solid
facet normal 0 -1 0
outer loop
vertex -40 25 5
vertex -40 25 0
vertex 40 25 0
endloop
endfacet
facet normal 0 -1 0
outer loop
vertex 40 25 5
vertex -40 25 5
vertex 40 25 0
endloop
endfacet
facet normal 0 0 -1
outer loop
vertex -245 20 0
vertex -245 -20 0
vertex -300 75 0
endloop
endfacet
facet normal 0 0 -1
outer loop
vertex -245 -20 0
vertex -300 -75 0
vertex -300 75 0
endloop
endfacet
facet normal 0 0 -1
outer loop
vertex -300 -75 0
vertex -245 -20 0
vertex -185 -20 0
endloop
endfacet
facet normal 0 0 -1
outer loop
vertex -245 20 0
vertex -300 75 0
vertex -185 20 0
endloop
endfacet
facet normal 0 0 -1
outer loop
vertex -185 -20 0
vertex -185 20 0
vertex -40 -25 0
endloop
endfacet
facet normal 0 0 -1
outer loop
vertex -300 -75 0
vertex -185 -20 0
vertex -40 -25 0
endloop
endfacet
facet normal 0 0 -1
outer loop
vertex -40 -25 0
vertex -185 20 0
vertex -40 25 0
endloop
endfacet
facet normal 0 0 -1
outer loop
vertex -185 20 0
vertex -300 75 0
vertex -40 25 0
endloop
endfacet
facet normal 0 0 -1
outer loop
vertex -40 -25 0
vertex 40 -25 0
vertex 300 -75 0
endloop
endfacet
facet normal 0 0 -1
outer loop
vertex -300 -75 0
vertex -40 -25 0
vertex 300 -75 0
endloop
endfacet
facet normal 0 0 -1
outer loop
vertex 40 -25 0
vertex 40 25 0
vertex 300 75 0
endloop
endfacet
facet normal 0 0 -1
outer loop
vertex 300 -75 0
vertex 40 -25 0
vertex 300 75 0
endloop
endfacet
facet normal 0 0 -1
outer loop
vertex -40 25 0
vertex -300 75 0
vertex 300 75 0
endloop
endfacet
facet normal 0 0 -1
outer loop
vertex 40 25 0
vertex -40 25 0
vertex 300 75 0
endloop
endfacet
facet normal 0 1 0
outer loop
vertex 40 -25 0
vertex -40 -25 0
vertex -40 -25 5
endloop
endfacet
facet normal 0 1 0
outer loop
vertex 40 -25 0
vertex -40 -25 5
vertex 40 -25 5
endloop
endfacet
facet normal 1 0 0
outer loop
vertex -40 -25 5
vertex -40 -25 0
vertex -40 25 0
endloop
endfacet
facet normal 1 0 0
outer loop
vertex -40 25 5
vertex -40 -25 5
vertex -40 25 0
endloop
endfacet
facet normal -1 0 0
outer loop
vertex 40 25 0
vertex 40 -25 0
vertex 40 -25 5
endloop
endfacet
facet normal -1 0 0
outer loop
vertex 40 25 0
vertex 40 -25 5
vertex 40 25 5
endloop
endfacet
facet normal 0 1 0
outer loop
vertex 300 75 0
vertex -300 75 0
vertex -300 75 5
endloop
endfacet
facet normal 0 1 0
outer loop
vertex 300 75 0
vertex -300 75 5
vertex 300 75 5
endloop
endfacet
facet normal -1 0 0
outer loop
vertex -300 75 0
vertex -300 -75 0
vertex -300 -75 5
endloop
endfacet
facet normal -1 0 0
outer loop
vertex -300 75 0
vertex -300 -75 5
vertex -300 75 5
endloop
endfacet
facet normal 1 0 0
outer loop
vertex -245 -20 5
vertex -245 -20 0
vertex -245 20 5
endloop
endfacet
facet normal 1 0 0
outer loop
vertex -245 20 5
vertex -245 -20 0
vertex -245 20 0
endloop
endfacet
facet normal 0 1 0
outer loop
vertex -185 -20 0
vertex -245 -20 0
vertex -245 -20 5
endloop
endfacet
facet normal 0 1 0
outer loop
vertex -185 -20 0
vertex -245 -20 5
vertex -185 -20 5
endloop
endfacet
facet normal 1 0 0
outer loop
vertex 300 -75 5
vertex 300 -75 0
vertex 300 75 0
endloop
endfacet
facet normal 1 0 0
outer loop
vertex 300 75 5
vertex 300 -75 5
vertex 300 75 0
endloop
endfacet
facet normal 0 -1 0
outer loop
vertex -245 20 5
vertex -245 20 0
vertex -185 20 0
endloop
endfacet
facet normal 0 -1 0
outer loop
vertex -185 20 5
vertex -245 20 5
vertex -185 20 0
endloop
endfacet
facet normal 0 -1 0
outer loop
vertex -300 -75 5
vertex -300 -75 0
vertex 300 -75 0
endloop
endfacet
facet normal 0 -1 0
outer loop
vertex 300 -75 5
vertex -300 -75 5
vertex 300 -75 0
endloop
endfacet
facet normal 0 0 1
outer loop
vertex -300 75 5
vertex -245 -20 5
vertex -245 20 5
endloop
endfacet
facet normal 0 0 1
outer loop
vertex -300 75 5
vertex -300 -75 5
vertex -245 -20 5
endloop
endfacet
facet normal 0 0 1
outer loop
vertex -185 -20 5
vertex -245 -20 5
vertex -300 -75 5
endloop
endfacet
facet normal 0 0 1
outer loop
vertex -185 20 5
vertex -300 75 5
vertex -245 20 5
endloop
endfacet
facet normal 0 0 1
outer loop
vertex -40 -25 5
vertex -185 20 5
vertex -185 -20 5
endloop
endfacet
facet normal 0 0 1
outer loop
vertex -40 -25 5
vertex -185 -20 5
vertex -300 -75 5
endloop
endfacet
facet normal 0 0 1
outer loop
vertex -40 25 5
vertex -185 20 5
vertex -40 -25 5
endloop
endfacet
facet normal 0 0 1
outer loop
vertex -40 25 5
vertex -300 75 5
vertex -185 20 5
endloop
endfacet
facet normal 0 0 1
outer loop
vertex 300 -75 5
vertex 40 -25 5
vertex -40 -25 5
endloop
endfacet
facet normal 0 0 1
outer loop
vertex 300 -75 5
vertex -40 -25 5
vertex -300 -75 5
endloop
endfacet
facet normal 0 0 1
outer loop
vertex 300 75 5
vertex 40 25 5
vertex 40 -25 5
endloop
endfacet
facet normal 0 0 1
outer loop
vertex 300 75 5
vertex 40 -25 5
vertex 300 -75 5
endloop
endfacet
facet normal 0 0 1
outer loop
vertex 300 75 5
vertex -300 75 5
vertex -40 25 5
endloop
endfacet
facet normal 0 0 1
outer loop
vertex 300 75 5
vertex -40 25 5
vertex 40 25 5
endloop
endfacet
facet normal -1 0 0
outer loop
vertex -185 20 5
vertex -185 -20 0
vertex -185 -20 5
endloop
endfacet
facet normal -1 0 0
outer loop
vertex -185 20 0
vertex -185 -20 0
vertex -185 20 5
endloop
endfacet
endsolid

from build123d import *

# Parameters (mm, degrees)
SKETCH1_W           = 600
SKETCH1_H           = 150
SKETCH1_W_2         = 60
SKETCH1_H_2         = 40
SKETCH1_W_3         = 80
SKETCH1_H_3         = 50
BOSS_EXTRUDE1_DEPTH = 5


with BuildPart() as part:
    # Sketch1 → Boss-Extrude1 (new body)
    with BuildSketch(Plane.XY):
        Rectangle(SKETCH1_W, SKETCH1_H)
        with Locations((-215, 0)):
            Rectangle(SKETCH1_W_2, SKETCH1_H_2, mode=Mode.SUBTRACT)
        Rectangle(SKETCH1_W_3, SKETCH1_H_3, mode=Mode.SUBTRACT)
    extrude(amount=BOSS_EXTRUDE1_DEPTH)


solid = part.part
